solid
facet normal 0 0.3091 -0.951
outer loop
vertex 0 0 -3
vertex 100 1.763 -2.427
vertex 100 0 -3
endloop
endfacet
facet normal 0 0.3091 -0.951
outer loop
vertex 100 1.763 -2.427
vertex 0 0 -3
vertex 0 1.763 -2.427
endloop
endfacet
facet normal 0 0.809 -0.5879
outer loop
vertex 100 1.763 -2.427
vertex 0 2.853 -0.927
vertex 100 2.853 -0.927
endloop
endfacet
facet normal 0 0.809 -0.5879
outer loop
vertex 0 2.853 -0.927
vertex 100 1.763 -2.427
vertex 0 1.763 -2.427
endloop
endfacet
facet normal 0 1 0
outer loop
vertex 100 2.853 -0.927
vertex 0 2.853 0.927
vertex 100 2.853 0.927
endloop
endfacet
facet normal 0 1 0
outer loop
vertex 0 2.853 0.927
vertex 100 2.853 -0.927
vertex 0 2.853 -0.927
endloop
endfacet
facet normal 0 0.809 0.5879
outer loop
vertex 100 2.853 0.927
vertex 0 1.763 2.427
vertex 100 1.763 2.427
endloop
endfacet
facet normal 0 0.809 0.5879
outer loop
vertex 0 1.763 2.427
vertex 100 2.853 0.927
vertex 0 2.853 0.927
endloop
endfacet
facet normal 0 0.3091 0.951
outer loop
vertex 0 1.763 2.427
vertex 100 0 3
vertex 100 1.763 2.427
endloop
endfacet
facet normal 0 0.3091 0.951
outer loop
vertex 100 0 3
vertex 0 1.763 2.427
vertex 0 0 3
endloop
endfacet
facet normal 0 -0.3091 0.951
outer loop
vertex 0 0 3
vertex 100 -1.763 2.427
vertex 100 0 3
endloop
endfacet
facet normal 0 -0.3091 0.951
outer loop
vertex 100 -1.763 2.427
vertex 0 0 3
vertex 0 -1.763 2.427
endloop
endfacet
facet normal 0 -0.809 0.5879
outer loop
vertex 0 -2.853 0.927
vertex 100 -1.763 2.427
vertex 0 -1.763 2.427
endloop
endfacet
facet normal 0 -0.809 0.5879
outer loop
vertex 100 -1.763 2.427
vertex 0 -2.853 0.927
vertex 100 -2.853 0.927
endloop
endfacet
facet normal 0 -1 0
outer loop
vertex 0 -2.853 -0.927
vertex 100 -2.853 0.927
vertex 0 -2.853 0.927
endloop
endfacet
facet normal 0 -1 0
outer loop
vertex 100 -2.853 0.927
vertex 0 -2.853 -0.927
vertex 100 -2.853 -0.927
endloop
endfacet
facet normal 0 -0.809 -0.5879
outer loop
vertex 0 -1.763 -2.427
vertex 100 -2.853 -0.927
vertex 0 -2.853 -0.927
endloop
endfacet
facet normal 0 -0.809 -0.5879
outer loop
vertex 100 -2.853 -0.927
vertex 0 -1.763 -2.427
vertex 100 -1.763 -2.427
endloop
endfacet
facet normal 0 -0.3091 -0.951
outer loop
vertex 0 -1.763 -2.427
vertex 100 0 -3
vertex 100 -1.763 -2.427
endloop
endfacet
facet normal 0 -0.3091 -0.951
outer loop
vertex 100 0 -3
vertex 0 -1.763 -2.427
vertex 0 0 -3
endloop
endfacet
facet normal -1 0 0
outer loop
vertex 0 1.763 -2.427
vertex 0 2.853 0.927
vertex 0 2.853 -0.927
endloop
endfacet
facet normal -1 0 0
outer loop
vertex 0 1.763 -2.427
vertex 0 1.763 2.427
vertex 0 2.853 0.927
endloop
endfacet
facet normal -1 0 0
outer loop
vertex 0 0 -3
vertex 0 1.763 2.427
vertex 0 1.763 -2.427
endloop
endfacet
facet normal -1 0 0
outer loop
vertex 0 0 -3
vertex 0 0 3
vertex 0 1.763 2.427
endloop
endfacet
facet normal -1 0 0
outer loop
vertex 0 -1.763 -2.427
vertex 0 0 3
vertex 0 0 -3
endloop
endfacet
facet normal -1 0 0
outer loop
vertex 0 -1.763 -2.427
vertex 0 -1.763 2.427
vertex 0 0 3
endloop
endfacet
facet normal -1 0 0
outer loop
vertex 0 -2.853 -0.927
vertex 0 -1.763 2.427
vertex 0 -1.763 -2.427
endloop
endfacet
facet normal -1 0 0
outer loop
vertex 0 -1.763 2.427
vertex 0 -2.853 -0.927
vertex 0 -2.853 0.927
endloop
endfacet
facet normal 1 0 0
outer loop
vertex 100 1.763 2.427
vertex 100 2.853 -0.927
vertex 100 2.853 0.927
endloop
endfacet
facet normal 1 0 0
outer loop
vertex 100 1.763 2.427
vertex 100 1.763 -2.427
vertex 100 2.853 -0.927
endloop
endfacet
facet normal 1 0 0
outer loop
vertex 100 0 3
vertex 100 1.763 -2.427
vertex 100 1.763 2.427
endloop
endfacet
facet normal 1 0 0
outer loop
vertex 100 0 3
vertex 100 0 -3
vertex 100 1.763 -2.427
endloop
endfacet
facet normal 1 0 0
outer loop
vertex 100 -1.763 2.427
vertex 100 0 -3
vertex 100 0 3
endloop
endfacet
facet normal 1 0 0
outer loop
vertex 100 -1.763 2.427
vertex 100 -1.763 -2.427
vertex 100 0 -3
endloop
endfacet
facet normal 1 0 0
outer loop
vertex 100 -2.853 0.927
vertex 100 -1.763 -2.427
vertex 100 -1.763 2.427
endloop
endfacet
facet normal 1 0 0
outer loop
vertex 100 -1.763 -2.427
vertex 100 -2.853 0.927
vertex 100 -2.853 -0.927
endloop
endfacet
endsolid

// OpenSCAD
// Library pulled in via `use <>`: only module/function definitions are
// imported; this top-level geometry must NOT appear in the consumer.
function beam_r(len) = len / 40 + 0.5;

module beam(len = 10) {
    rotate([0, 90, 0]) cylinder(h = len, r = beam_r(len));
}

// Top-level geometry that `use` consumers must ignore.
beam(100);
